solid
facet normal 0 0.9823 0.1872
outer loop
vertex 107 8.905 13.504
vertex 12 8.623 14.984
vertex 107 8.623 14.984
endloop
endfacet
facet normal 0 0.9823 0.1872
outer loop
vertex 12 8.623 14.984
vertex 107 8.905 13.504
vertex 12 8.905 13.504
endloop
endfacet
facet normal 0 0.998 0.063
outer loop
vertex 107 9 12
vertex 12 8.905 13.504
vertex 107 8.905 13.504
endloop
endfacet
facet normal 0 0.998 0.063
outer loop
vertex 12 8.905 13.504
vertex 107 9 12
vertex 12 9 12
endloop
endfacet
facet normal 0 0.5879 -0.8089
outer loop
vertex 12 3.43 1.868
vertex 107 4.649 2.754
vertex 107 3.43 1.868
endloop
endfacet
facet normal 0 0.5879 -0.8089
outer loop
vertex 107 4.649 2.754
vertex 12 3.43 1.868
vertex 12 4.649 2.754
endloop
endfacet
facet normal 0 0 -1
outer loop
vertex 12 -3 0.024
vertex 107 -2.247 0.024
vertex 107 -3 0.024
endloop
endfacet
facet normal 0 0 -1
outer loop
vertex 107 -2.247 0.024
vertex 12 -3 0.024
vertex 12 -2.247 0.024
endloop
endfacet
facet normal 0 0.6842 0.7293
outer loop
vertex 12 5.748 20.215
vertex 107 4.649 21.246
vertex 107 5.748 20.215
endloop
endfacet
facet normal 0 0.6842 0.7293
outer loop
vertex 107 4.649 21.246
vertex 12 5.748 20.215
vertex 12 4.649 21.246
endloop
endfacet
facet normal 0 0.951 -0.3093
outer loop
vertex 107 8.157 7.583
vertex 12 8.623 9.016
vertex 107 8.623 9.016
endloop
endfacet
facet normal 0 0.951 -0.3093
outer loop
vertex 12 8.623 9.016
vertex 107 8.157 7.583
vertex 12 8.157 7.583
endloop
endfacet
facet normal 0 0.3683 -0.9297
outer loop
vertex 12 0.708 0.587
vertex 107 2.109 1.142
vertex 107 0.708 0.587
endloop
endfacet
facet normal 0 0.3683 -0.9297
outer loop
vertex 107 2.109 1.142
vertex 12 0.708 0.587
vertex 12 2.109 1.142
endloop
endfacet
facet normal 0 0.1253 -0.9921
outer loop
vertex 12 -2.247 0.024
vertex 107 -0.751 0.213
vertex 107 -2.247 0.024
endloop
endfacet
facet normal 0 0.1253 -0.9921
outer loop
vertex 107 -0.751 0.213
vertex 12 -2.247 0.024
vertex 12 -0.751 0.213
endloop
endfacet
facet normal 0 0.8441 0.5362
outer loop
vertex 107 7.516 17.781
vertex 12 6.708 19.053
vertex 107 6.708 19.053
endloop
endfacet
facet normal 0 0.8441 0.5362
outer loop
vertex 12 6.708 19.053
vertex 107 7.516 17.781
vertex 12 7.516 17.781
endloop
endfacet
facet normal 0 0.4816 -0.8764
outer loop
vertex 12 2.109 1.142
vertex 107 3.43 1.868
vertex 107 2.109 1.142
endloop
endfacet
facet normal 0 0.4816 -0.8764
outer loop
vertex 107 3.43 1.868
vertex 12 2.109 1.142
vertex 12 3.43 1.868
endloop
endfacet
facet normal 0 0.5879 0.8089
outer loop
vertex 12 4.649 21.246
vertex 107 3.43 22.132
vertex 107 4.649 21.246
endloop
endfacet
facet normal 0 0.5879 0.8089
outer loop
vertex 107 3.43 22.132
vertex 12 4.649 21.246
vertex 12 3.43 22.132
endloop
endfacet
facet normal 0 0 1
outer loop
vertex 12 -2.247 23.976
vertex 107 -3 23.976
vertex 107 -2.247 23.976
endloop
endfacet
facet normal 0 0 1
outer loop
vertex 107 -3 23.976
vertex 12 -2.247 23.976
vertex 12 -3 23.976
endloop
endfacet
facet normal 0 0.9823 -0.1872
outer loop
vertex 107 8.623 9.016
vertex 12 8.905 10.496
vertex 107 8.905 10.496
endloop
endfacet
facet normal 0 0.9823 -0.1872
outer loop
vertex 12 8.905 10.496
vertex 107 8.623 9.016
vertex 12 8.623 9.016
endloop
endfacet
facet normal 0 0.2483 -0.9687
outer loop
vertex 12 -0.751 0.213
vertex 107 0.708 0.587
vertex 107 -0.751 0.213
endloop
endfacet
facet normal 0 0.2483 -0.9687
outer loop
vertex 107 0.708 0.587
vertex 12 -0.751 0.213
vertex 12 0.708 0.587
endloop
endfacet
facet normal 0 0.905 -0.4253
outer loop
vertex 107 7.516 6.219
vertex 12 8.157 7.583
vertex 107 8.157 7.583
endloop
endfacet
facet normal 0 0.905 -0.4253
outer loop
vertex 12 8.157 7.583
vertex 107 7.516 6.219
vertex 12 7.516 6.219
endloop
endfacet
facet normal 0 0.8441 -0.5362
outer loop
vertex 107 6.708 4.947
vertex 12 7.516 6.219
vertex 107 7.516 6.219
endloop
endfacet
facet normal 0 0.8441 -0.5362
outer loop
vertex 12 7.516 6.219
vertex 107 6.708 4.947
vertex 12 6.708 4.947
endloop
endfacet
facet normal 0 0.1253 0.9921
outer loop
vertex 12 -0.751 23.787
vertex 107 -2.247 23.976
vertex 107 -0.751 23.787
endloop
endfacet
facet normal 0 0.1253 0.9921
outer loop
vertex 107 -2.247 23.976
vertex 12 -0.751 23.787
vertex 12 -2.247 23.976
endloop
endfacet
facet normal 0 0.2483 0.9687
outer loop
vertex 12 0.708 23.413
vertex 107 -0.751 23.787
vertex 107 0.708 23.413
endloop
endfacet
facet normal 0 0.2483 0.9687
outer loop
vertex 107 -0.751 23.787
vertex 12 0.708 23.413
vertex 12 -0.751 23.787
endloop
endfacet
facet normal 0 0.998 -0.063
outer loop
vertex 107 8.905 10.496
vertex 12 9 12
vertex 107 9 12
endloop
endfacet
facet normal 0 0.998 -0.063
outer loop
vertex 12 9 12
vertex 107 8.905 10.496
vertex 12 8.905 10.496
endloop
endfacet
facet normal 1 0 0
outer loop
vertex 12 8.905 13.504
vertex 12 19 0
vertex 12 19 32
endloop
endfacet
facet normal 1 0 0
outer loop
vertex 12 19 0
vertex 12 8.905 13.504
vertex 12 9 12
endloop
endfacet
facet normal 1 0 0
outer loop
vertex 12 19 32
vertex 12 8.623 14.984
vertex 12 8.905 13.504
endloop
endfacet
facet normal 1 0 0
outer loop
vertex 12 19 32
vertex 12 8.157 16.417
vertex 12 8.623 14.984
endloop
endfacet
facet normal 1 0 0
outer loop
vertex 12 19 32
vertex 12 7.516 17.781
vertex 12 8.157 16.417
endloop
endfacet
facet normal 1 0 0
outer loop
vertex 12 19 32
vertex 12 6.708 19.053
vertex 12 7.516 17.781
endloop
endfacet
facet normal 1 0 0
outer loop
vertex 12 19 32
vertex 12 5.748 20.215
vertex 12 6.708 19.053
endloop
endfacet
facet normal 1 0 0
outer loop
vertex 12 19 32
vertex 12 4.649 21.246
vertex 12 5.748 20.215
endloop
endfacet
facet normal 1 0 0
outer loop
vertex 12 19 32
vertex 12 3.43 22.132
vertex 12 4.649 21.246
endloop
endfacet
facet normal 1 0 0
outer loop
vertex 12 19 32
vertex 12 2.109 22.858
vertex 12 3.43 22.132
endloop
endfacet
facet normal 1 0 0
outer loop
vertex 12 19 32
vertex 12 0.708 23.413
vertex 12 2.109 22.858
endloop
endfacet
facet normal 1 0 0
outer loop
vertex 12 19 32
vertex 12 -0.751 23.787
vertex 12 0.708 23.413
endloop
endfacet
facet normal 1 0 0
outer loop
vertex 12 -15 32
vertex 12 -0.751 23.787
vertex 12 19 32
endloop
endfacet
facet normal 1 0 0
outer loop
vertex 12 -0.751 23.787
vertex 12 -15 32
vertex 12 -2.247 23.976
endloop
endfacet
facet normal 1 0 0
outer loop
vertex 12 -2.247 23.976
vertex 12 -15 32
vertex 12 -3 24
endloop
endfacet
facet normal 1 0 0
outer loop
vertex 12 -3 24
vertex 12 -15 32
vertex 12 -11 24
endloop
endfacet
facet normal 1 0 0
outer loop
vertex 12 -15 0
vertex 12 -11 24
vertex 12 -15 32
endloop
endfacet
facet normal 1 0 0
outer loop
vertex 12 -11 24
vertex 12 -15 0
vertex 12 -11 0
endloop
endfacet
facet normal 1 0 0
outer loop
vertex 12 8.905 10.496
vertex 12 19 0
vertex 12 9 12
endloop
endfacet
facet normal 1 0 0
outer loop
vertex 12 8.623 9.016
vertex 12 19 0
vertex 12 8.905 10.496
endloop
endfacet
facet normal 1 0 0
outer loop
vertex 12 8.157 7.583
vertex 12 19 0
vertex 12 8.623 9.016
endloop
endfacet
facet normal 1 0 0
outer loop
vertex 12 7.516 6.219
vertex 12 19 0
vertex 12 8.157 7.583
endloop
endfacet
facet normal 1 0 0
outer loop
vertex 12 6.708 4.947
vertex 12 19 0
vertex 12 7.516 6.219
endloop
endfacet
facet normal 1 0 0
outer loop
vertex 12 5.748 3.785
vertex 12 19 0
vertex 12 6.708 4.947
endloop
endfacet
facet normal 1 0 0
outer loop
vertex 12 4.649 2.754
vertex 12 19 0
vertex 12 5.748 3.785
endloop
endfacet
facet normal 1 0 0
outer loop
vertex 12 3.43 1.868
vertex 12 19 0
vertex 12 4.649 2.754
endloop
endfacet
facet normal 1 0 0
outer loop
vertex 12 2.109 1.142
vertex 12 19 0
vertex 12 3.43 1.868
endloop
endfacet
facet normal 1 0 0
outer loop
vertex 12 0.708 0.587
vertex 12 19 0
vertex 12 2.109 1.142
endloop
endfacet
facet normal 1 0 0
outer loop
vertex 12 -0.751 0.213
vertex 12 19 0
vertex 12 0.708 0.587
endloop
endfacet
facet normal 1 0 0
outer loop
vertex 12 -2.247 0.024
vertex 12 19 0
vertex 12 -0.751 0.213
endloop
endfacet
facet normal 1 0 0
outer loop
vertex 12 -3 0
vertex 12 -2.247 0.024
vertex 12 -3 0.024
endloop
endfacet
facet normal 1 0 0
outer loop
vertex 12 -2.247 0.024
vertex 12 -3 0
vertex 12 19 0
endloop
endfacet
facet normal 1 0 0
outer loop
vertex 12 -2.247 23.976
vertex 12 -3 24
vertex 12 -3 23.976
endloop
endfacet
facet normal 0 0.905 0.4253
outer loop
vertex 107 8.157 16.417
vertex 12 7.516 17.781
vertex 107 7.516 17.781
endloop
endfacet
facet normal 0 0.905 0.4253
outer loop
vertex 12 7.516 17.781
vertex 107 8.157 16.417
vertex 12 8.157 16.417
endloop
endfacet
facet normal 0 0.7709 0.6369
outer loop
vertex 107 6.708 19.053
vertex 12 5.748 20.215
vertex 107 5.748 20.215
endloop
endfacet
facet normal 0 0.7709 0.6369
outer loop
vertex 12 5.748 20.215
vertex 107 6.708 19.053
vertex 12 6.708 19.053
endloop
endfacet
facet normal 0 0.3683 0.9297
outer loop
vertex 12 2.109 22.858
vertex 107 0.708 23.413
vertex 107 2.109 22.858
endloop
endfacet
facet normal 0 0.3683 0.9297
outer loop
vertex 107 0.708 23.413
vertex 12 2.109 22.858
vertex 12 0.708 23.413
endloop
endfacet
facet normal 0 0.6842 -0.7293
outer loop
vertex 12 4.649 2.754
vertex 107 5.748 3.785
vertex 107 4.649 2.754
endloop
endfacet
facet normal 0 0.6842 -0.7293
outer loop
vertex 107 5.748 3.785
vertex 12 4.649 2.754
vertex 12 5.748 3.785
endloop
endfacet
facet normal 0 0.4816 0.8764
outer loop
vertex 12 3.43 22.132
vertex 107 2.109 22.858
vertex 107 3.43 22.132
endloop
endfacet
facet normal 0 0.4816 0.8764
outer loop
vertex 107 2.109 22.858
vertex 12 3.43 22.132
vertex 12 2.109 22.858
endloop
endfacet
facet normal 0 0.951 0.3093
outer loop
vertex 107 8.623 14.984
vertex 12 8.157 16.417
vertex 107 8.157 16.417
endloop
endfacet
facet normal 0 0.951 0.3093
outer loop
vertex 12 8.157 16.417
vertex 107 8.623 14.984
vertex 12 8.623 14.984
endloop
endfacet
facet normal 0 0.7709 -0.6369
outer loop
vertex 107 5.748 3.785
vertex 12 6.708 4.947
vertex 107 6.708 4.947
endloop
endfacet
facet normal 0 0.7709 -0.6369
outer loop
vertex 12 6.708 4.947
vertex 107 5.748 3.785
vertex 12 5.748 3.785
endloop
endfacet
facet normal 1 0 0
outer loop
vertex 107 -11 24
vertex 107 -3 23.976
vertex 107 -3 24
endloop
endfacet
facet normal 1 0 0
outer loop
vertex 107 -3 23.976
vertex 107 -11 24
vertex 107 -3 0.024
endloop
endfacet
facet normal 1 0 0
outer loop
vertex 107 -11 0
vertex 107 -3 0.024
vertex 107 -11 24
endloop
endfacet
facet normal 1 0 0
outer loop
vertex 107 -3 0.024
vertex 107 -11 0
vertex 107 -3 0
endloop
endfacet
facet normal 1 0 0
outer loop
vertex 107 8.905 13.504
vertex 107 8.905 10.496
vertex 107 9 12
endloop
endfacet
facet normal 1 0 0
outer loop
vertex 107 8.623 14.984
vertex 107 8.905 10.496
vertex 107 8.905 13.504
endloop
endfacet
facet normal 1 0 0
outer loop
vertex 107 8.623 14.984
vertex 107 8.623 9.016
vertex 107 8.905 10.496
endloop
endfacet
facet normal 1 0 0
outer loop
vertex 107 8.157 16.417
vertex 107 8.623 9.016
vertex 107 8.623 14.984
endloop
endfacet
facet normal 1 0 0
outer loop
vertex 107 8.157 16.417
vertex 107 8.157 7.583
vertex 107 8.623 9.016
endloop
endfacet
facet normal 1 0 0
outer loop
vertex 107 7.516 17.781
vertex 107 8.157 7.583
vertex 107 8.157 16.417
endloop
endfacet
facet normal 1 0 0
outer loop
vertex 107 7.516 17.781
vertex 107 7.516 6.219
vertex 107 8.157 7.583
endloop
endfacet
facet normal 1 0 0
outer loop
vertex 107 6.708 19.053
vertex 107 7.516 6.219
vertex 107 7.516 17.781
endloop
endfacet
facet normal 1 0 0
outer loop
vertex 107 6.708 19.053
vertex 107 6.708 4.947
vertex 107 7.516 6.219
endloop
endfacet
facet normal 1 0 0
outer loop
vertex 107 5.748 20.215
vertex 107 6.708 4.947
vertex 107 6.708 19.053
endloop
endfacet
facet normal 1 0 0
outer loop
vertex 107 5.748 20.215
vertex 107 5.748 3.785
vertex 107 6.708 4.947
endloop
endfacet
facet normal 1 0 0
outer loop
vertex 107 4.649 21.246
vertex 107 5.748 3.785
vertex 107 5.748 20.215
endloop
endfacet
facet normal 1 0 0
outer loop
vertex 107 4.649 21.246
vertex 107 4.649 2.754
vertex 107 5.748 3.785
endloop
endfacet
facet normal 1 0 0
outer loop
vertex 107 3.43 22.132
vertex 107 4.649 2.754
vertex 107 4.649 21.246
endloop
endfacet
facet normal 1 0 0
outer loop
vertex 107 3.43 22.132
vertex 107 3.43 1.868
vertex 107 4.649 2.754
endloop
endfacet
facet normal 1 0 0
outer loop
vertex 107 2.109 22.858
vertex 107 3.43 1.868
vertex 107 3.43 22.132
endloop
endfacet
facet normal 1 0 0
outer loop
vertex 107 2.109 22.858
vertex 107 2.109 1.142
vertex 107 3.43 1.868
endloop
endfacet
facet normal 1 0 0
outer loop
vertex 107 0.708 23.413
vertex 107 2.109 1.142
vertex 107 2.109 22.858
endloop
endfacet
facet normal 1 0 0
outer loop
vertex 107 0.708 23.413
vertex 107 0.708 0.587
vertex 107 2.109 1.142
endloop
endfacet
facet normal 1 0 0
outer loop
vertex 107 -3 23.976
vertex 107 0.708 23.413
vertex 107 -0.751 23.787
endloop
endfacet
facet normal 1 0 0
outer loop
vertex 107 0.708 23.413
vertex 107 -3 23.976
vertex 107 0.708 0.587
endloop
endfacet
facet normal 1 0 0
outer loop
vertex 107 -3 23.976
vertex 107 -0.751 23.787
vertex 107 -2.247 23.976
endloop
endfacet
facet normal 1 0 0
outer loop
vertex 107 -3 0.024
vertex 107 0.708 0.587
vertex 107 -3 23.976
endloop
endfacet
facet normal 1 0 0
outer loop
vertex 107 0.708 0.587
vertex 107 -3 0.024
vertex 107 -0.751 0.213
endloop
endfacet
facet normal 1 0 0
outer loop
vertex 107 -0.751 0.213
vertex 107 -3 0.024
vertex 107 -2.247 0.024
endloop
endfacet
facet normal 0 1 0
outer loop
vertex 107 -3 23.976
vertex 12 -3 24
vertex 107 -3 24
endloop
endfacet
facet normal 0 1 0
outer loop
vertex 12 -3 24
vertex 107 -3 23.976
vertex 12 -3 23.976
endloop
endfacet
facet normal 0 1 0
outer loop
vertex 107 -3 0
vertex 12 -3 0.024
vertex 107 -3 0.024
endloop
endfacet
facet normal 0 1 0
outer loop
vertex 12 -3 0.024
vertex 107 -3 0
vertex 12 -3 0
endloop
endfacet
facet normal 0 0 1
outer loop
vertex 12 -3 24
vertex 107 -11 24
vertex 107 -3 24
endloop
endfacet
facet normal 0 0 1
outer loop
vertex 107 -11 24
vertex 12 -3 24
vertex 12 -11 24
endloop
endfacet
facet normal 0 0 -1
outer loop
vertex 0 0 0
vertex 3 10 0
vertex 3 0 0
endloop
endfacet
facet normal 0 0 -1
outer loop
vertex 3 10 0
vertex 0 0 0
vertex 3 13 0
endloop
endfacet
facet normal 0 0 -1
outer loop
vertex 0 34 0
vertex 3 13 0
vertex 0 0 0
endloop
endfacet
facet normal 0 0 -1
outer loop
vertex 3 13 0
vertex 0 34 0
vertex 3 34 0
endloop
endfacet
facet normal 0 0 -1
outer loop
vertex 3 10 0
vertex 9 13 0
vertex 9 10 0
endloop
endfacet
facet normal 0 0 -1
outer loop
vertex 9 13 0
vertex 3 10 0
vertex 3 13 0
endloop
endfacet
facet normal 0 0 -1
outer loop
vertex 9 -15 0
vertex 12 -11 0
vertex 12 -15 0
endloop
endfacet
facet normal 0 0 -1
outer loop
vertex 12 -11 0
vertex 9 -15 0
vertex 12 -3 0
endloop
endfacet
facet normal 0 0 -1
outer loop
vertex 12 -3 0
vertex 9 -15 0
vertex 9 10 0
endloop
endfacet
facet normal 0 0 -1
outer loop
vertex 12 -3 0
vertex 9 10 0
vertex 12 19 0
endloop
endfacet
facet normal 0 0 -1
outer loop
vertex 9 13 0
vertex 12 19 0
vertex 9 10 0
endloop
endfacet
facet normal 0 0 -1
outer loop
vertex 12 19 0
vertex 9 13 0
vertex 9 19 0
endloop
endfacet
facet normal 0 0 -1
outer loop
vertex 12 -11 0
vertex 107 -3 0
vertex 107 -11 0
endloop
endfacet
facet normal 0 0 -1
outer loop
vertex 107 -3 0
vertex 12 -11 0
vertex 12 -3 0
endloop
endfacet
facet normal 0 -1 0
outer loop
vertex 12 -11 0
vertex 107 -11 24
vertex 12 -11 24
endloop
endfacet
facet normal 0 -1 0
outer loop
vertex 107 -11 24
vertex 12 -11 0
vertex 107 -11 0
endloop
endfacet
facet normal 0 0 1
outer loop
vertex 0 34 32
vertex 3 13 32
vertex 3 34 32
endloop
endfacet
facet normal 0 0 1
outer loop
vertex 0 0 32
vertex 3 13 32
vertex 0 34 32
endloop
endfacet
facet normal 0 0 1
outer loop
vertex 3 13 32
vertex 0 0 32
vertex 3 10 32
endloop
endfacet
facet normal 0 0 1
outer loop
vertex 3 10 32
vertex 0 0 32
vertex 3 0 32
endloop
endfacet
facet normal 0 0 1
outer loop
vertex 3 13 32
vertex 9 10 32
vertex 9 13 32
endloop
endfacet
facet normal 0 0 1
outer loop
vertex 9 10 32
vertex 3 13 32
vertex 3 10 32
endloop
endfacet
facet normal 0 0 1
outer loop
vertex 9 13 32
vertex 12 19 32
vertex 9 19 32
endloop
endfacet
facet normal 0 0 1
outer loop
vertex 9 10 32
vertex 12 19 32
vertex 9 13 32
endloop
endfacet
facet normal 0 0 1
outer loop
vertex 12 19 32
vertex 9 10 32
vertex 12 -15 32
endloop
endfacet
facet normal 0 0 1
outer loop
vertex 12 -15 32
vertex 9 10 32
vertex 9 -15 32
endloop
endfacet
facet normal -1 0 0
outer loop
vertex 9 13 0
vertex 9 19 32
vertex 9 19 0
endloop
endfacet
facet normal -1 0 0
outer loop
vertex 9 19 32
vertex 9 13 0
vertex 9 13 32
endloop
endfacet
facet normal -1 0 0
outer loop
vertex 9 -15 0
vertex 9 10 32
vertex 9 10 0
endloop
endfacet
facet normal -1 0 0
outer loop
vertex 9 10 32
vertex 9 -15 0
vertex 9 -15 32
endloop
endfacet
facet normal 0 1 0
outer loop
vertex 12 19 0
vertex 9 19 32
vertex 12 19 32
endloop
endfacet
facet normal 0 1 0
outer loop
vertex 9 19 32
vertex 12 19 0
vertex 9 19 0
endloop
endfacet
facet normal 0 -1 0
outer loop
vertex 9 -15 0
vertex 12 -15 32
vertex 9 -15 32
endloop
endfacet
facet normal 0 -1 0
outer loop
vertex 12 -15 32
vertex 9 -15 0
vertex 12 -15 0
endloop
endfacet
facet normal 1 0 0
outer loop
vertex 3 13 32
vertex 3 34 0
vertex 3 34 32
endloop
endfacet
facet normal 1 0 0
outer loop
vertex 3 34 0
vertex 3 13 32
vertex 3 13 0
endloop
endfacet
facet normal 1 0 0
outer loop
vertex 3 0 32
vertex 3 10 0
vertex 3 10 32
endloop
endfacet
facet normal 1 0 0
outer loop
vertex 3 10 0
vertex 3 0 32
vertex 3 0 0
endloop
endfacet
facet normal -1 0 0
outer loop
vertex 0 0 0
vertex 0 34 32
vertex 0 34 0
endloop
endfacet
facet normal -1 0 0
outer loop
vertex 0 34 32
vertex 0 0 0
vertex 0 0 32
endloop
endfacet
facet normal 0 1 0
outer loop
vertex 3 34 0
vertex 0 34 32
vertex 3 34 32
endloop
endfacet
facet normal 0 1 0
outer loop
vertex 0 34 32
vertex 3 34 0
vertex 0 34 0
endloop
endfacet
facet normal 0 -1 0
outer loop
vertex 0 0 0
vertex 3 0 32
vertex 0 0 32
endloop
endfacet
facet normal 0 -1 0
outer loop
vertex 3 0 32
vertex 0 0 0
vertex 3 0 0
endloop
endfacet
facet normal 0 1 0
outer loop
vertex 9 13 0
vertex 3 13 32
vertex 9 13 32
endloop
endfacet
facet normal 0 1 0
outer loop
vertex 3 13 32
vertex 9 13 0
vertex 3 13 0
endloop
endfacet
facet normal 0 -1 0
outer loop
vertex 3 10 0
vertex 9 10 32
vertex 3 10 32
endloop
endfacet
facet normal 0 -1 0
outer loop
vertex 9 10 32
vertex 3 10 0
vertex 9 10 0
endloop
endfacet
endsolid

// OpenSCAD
radius = 12;

cube([3, 34, 32]);
translate([3, 10, 0])
cube([6, 3, 32]);

translate([9, -15, 0]) {
  cube([3, 34, 32]);
  translate([3, 0, 0]) {
    difference() {
      translate([0, 12, radius])
      rotate([90, 0, 90])
      cylinder(h=95, r=radius, $fn=50);
      translate([0, -radius, 0])
      cube([95, radius * 2, radius * 2]);
    }
    translate([0, 4, 0])
    cube([95, 8, radius * 2]);
  }
}
